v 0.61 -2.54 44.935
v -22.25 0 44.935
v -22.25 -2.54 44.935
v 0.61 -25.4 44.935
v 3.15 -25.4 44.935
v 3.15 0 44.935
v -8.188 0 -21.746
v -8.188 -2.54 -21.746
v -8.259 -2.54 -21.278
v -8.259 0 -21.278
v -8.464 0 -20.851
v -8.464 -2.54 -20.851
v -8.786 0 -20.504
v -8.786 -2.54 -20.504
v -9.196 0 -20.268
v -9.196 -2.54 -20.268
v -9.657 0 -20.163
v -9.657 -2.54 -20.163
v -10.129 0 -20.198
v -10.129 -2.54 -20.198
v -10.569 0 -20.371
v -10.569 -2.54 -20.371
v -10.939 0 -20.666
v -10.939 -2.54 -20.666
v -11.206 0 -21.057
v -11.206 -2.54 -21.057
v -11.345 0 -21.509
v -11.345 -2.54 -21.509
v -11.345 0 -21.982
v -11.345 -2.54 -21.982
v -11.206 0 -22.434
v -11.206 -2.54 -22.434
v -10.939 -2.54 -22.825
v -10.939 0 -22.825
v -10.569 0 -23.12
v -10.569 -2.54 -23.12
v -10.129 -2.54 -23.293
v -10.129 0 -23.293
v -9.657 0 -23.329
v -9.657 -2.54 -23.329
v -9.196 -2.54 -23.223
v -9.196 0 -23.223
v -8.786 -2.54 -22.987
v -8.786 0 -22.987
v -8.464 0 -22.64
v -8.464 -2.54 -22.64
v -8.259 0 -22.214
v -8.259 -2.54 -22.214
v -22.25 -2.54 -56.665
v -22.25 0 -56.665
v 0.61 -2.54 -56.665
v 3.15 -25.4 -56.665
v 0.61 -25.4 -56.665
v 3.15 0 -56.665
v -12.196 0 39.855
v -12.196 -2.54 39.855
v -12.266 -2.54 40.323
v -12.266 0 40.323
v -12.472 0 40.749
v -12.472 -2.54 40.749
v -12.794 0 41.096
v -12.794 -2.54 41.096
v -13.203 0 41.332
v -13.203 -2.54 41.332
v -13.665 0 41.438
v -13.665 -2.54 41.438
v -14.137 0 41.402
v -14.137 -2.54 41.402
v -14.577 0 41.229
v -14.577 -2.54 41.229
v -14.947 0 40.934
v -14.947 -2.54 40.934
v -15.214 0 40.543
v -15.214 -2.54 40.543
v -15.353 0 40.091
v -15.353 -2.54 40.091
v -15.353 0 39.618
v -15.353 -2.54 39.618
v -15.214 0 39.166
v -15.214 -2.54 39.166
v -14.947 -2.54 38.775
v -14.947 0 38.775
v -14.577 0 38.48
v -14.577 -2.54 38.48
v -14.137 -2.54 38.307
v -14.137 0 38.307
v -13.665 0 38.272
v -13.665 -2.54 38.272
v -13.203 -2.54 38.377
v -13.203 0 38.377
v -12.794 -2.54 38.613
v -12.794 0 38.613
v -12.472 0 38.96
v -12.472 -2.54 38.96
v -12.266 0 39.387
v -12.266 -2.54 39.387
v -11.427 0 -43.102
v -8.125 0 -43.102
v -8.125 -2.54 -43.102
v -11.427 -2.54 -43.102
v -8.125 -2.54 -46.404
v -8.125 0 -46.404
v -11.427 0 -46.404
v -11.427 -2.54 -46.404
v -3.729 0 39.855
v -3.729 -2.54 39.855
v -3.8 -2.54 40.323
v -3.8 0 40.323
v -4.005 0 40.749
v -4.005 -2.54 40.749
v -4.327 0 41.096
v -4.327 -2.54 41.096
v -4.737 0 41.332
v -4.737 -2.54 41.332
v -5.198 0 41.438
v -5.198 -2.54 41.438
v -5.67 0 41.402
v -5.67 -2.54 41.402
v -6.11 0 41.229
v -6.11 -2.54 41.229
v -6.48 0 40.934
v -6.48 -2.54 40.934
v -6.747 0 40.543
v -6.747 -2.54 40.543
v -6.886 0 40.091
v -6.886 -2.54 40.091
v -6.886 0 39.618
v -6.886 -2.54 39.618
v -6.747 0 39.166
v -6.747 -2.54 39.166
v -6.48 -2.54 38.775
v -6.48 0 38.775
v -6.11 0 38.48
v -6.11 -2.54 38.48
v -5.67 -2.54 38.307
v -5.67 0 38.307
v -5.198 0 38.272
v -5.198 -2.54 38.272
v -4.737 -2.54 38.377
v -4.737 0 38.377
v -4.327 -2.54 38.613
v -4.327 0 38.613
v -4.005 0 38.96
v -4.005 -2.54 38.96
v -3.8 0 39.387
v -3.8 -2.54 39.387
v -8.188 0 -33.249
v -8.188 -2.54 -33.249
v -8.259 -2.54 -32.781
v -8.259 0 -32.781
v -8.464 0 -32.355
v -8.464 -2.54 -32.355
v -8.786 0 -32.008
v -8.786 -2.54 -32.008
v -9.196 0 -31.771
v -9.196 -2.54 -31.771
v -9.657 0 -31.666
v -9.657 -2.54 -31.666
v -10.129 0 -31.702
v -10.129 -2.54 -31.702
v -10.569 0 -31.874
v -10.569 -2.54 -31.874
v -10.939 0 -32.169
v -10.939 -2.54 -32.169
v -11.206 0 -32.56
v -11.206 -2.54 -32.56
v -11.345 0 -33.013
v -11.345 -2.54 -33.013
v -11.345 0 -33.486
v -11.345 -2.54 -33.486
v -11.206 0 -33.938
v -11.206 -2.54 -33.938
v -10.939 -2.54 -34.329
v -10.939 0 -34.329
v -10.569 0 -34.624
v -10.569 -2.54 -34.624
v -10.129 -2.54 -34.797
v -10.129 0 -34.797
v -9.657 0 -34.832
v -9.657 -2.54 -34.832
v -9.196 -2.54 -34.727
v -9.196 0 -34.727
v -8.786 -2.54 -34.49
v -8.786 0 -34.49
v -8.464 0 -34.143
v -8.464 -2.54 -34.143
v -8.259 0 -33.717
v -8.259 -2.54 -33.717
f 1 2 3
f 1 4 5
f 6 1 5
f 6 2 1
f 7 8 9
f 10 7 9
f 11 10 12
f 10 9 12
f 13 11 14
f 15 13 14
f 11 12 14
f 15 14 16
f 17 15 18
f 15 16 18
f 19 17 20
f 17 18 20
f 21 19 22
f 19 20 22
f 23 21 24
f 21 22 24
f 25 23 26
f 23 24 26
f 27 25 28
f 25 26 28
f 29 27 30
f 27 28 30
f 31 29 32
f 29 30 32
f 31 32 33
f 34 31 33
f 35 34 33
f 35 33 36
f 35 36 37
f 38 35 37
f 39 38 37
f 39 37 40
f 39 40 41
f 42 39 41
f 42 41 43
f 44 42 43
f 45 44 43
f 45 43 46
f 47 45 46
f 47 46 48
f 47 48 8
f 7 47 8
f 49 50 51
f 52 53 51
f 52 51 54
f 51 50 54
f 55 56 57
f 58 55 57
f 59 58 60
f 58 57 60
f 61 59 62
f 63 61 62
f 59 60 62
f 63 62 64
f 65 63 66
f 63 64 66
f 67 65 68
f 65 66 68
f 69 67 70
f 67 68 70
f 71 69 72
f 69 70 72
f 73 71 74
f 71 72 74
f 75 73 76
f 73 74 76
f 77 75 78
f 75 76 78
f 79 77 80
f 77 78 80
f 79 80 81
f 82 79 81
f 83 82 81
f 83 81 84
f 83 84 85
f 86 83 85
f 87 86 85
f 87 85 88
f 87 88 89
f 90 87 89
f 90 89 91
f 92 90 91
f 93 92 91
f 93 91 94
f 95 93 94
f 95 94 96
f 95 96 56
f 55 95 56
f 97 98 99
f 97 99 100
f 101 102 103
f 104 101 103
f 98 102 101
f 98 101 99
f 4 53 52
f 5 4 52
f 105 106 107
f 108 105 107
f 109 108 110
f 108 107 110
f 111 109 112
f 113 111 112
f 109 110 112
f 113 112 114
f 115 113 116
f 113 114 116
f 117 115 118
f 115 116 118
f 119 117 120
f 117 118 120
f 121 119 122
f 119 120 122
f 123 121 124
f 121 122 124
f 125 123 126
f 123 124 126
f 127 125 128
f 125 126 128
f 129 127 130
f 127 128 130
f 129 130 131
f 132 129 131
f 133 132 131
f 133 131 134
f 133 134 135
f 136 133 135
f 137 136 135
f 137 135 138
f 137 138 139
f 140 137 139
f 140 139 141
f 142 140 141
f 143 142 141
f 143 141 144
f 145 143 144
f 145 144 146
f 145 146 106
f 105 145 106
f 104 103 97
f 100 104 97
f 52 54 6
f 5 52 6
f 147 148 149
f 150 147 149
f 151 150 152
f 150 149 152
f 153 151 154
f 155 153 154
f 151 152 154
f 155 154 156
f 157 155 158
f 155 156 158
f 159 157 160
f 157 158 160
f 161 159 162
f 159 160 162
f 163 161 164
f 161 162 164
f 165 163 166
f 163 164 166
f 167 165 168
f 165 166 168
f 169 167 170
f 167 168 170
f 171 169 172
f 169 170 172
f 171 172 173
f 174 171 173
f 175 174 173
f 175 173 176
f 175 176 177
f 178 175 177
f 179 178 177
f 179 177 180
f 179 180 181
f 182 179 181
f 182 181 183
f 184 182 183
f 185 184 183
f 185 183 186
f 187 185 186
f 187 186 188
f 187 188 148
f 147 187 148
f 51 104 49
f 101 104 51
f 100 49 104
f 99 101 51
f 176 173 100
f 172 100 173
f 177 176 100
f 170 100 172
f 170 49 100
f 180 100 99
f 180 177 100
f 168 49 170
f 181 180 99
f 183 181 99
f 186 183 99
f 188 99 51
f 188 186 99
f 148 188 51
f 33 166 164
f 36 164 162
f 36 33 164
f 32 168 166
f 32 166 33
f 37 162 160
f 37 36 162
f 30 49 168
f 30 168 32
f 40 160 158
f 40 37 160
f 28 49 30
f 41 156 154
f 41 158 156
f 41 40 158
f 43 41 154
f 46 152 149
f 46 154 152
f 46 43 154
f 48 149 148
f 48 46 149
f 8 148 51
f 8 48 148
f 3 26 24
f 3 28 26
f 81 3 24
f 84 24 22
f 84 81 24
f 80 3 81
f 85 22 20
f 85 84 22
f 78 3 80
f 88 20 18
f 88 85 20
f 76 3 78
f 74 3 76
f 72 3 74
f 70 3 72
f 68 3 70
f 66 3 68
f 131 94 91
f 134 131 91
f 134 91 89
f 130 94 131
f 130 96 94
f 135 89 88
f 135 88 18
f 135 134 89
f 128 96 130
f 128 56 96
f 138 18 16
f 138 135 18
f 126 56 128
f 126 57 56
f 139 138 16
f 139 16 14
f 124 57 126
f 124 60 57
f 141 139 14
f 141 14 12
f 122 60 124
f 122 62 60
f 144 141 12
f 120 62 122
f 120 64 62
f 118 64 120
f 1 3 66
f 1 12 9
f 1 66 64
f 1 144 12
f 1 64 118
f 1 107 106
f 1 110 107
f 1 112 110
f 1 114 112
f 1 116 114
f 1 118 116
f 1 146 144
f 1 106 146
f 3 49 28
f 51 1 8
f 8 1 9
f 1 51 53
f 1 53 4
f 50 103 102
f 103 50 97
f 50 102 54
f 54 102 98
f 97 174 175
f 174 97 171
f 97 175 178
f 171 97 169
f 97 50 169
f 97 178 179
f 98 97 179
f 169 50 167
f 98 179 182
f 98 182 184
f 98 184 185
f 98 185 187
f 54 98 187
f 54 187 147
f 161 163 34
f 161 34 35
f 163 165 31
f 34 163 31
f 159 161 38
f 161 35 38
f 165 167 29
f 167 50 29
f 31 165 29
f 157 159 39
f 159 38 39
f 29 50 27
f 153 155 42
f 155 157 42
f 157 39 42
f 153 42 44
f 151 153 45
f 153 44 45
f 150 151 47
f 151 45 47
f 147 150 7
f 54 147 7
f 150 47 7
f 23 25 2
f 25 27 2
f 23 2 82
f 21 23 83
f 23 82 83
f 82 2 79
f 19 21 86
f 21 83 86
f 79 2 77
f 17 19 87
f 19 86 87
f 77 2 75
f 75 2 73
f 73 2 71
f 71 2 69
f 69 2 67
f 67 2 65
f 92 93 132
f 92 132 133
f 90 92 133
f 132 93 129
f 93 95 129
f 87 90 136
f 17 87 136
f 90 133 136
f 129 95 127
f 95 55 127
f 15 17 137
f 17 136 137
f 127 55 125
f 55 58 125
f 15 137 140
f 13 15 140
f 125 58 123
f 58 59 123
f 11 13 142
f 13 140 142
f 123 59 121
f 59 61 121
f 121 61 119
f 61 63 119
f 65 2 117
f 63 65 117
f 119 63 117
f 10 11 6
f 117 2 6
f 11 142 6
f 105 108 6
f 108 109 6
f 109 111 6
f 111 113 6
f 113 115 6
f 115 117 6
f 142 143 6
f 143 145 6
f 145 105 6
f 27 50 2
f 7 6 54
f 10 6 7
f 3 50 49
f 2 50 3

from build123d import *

# Parameters (mm, degrees)
F0_W     = 25.4
F0_H     = 101.6
F1_DEPTH = 25.4
F2_T     = -2.54
F4_D     = 3.175
F5_D     = 3.175
F3_W     = 3.302
F3_H     = 3.302
F6_DEPTH = 10.16


with BuildPart() as f1:
    # F0 (on Front) → F1 (new body)
    with BuildSketch(Plane.XZ):
        with Locations((-9.550009, -5.865395)):
            Rectangle(F0_W, F0_H)
    extrude(amount=F1_DEPTH)

    # F2
    f2_openings = [f1.faces().sort_by_distance(p)[0] for p in [
        (-9.550009, -25.4, -5.865395),
        (-9.550009, -12.7, 44.934605),
        (-22.250009, -12.7, -5.865395),
        (-9.550009, -12.7, -56.665395),
    ]]
    offset(amount=F2_T, openings=f2_openings)

    # F4 (through all)
    with Locations(Plane(origin=(0, 0, 0), x_dir=(-1, 0, 0), z_dir=(0, 1, 0))):
        with Locations((9.775658, -21.745628), (9.775658, -33.249211)):
            Hole(F4_D / 2)

    # F5 (through all)
    with Locations(Plane(origin=(0, 0, 0), x_dir=(-1, 0, 0), z_dir=(0, 1, 0))):
        with Locations((5.316675, 39.854605), (13.783342, 39.854605)):
            Hole(F5_D / 2)

    # F3 (on face) → F6 (cut)
    with BuildSketch(Plane(origin=(0, 0, 0), x_dir=(-1, 0, 0), z_dir=(0, 1, 0))):
        with Locations((9.775658, -44.752795)):
            Rectangle(F3_W, F3_H)
    extrude(amount=-F6_DEPTH, mode=Mode.SUBTRACT)


solid = f1.part
